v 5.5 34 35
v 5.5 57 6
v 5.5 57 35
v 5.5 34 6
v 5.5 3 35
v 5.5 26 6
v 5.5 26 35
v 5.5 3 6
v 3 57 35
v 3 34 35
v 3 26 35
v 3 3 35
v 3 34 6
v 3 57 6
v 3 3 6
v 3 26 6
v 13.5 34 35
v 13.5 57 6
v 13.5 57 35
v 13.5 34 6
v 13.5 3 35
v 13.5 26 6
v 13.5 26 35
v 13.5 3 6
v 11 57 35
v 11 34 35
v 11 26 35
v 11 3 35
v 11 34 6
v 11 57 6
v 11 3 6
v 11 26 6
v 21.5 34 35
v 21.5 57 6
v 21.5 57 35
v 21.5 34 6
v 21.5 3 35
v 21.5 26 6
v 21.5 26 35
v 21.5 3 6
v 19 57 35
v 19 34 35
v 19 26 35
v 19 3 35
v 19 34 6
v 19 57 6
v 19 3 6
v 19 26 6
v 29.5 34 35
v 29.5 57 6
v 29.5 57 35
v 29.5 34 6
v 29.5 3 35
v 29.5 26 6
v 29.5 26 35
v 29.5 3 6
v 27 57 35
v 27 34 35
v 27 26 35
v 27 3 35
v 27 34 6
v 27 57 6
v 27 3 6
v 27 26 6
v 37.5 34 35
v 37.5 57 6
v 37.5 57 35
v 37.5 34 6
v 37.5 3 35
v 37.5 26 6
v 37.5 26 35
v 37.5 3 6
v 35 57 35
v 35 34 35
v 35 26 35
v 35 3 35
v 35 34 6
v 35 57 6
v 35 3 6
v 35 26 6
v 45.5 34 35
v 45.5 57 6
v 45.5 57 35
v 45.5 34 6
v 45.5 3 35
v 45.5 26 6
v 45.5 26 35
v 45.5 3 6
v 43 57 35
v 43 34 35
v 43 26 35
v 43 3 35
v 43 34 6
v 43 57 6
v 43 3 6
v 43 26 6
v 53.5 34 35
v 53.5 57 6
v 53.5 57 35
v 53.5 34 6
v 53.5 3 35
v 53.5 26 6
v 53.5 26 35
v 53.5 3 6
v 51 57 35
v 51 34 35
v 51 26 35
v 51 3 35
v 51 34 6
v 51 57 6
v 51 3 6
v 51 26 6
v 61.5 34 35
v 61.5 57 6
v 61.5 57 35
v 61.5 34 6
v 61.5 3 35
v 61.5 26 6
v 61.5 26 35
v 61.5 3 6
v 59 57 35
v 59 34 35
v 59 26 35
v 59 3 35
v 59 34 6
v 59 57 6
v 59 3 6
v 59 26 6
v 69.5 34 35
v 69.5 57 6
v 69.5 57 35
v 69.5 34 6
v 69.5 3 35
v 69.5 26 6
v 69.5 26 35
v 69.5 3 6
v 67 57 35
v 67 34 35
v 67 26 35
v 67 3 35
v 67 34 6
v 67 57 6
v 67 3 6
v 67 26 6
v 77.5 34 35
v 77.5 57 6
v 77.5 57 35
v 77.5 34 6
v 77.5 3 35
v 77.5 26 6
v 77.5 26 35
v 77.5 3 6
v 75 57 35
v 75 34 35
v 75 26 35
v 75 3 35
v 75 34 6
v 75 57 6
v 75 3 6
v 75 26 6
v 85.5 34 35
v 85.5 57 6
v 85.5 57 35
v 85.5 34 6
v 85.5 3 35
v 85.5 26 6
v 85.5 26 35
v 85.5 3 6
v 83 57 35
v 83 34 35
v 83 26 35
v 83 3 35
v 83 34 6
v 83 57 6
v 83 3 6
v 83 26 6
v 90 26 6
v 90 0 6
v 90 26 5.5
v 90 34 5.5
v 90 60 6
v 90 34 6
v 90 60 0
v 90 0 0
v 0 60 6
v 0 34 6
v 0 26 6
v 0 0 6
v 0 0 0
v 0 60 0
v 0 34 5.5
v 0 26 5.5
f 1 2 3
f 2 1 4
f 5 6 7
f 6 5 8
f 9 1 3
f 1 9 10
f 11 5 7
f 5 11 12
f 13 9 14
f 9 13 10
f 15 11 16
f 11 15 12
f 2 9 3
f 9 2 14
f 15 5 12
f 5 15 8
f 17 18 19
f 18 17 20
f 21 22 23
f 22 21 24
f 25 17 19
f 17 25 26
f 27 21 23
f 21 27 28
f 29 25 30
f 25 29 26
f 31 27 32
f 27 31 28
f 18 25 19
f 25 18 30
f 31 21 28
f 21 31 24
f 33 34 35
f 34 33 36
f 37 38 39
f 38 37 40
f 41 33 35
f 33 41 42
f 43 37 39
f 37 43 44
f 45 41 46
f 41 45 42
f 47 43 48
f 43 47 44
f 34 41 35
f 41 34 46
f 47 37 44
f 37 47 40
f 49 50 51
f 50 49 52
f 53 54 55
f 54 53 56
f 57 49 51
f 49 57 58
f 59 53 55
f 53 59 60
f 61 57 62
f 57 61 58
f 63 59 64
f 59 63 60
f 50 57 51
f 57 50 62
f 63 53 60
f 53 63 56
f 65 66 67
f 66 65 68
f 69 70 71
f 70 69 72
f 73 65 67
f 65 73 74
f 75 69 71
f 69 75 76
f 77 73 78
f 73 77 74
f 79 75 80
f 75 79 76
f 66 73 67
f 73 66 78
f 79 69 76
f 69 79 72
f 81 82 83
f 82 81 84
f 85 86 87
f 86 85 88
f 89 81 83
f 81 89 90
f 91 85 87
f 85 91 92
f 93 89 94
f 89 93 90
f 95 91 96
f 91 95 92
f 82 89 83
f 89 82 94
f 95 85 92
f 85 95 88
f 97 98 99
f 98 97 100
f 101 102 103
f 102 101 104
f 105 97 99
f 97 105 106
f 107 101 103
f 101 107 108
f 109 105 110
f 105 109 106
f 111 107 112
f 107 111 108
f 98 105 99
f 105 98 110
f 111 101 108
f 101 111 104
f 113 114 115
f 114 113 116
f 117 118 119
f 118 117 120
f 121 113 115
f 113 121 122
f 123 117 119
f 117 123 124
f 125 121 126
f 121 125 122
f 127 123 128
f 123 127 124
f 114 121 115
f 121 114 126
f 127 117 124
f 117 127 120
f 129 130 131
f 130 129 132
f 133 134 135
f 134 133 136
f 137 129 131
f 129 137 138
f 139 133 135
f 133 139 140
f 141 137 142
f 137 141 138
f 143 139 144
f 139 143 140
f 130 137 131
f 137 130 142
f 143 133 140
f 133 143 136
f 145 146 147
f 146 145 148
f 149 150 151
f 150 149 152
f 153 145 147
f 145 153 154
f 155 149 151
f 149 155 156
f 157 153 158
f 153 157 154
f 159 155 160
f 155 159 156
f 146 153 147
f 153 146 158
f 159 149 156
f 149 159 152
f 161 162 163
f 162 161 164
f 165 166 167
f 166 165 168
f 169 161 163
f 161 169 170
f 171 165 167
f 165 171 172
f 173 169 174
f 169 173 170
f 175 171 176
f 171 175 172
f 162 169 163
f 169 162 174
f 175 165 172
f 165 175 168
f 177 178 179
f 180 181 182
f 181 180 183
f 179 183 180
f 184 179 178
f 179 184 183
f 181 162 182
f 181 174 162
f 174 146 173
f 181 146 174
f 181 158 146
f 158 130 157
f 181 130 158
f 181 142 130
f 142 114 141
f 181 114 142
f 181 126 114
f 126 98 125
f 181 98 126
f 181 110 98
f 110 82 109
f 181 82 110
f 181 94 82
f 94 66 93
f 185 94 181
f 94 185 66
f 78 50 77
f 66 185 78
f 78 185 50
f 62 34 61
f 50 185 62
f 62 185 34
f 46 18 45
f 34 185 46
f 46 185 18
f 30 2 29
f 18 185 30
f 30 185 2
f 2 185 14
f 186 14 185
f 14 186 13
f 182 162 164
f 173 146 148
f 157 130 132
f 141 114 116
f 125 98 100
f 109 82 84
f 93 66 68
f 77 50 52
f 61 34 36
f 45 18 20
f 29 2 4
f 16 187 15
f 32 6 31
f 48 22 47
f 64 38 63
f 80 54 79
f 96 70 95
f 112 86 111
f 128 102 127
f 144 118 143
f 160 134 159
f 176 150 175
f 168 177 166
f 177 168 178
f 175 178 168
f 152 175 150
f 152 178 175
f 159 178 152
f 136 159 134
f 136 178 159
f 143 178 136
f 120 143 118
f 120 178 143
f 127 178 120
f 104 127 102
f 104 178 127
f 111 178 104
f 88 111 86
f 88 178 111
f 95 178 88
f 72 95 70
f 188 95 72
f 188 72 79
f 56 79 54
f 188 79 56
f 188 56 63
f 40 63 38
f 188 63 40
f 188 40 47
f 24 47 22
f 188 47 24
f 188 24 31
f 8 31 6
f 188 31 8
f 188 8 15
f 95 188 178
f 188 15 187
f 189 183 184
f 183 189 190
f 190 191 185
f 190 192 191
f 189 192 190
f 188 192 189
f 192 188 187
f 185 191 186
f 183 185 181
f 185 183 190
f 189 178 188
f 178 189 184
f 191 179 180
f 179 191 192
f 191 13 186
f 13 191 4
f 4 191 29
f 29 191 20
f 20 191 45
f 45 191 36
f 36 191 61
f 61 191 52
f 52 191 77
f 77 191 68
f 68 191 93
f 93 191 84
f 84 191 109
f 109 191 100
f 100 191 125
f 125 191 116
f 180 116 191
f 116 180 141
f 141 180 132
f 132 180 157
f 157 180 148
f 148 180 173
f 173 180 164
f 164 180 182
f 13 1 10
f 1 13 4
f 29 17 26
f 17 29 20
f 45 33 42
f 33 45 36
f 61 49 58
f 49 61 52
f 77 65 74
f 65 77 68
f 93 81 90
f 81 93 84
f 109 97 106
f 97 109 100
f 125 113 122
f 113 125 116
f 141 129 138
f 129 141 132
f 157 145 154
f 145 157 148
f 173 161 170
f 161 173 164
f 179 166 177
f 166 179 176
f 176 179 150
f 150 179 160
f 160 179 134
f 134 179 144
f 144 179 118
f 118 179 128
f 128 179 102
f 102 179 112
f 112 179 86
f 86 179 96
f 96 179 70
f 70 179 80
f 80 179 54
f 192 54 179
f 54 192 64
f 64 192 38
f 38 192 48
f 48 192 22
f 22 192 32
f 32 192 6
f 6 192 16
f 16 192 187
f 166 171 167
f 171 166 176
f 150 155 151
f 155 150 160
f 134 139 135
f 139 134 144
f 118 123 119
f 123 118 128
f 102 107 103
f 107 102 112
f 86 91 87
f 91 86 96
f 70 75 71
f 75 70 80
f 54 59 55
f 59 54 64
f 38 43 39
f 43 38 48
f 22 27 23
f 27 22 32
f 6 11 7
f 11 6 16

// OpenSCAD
$fn = 32;

// ----------------------------------------------------------------------
// Heatsink: slotted fin block
// ----------------------------------------------------------------------

// --- parameters (mm) ---
base_l = 90;              // base length, X
base_w = 60;              // base width, Y
base_t = 6;               // base plate thickness
fin_h = 30;               // fin height above the base
fin_t = 2.5;              // fin thickness
edge = 3;                 // margin from the base ends
pitch = 8;                // fin pitch
slot_w = 8;               // central slot width, Y

n_fins = floor((base_l - 2 * edge - fin_t) / pitch) + 1;  // fin count
total_h = base_t + fin_h - 1;  // overall height

difference() {
union() {
  cube([base_l, base_w, base_t]);
  for (i = [0 : n_fins - 1])
    translate([edge + i * pitch, edge, base_t - 1])
      cube([fin_t, base_w - 2 * edge, fin_h]);
}
  translate([-1, base_w / 2 - slot_w / 2, base_t - 0.5])
    cube([base_l + 2, slot_w, fin_h + 2]);
}
